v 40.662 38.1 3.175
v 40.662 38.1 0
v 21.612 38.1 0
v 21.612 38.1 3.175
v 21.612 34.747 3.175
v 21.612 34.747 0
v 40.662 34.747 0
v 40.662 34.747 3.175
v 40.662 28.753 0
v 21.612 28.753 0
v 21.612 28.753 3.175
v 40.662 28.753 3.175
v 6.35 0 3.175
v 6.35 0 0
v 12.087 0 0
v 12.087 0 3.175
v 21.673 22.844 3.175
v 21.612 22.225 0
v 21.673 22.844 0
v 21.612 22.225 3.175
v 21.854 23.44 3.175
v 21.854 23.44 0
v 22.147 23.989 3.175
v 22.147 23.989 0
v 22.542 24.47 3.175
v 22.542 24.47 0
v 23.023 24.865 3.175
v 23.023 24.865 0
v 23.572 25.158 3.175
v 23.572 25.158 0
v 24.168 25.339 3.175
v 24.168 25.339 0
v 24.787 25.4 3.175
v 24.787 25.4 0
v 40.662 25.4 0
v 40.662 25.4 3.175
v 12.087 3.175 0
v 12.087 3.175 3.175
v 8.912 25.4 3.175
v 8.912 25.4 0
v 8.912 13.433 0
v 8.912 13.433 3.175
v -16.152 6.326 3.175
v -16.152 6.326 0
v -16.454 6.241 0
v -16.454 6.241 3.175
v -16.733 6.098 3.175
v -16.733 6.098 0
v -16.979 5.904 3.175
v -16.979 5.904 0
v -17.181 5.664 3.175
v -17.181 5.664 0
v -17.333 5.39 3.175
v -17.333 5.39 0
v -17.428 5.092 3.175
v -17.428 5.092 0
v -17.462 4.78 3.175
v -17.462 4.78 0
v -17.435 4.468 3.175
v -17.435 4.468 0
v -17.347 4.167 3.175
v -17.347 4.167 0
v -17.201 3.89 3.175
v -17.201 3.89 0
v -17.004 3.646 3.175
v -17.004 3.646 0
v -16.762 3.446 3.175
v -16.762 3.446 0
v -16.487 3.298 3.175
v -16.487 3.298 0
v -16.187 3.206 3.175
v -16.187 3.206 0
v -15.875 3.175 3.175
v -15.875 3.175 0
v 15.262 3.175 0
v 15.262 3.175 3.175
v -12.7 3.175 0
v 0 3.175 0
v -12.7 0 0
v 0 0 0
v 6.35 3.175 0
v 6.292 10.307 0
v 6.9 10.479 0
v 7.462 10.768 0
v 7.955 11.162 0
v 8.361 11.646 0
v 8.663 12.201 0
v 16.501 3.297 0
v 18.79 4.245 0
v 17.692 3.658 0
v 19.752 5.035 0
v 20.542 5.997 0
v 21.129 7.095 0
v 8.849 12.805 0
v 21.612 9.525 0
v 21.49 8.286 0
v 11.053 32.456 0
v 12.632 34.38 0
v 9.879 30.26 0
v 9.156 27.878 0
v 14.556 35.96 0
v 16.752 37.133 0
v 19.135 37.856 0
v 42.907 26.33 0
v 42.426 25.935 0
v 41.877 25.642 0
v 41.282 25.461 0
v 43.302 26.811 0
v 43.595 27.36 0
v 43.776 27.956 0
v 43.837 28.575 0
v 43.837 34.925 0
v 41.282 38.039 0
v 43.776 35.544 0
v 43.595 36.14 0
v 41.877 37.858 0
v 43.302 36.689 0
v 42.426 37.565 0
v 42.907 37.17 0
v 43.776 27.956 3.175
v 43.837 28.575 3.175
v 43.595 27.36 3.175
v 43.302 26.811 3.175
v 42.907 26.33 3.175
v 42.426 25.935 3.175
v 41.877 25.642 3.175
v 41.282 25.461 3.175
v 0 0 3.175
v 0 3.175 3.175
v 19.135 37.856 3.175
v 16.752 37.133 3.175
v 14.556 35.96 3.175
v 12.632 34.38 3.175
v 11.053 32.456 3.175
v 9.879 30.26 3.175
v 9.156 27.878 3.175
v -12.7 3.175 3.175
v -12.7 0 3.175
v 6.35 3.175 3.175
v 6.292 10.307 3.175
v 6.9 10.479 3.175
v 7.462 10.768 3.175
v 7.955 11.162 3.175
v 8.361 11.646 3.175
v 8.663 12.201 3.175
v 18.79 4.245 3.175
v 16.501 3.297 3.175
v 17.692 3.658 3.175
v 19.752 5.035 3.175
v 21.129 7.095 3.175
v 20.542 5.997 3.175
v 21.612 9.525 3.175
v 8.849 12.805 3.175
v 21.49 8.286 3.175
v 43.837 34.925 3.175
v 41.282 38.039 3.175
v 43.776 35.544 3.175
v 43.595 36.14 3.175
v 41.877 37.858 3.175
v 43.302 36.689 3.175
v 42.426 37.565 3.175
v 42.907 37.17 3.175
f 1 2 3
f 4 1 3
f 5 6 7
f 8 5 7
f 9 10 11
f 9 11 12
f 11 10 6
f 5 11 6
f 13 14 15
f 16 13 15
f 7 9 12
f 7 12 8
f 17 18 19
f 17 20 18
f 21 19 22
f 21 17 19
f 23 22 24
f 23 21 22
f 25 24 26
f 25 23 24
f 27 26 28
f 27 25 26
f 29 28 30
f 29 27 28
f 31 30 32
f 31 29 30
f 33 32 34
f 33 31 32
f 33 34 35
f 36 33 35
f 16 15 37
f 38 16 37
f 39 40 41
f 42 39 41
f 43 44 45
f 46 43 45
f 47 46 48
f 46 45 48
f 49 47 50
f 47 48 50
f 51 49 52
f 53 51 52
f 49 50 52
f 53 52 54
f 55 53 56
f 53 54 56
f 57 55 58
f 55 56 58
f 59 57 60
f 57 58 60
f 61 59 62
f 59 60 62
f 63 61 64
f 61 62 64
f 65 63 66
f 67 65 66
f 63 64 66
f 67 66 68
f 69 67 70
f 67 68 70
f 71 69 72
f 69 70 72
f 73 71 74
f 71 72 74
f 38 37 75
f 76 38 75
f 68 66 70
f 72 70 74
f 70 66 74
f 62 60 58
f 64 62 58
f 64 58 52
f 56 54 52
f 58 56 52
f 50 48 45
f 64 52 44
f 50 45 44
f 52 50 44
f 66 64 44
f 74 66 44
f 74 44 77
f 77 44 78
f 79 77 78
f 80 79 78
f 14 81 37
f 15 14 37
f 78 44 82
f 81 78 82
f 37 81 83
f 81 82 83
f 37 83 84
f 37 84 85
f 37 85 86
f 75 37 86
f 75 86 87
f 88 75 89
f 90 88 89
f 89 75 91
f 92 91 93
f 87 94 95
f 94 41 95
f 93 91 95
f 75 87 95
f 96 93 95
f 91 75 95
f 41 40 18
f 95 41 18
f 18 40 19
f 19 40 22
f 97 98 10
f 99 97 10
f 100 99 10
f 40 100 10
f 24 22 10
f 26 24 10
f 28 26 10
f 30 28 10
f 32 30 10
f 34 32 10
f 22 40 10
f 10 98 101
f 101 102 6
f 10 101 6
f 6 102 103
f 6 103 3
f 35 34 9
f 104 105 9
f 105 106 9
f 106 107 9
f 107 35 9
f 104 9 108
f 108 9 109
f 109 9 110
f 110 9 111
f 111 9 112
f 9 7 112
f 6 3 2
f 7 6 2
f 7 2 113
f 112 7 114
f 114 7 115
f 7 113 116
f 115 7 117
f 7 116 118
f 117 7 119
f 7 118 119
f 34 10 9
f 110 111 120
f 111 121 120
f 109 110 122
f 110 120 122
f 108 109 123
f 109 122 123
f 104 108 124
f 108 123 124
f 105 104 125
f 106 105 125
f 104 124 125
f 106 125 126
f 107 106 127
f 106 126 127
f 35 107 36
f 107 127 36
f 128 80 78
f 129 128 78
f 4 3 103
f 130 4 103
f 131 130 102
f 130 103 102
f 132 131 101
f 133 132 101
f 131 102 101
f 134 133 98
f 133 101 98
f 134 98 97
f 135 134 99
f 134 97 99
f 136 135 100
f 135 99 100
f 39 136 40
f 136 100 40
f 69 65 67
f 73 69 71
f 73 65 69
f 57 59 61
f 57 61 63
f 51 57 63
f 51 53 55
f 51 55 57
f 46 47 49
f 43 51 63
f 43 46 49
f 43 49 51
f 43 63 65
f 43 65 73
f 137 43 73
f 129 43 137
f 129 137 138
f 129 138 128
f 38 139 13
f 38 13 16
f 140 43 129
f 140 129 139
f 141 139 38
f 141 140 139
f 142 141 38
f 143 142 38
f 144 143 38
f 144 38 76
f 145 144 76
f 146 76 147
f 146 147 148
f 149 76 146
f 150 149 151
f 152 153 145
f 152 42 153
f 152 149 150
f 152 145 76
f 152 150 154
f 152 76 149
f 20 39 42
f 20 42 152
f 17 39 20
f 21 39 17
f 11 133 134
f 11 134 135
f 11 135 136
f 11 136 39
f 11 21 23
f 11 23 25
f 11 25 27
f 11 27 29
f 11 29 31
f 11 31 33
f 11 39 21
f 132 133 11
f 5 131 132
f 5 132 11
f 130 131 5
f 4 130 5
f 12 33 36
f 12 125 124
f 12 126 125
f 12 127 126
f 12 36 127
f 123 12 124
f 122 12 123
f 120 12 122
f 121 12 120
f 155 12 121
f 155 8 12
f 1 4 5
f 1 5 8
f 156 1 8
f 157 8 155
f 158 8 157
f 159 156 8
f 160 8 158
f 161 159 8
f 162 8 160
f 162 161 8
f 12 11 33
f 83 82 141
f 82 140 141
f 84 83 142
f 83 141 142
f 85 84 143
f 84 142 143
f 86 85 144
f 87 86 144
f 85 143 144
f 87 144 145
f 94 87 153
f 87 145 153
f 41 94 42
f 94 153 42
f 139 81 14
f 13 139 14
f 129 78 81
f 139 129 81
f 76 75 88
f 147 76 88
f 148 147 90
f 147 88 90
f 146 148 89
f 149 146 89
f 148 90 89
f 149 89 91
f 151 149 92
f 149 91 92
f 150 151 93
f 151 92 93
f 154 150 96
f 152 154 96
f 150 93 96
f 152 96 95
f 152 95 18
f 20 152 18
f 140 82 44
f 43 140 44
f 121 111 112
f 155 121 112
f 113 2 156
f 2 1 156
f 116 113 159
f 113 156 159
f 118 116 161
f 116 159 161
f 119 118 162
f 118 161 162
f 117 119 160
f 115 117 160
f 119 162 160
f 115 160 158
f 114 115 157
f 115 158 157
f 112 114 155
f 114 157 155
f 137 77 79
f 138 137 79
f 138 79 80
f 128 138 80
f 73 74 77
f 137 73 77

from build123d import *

# Parameters (mm, degrees)
SKETCH1_W           = 19.05
SKETCH1_H           = 5.9944
BOSS_EXTRUDE1_DEPTH = 3.175
FILLET1_R           = 3.175
FILLET2_R           = 3.175


with BuildPart() as part:
    # Sketch1 → Boss-Extrude1 (new body)
    with BuildSketch(Plane.XY):
        with BuildLine():
            Line((0, 3.175), (6.35, 3.175))
            Line((6.35, 3.175), (6.35, 0))
            Line((6.35, 0), (12.087173363, 0))
            Line((12.087173363, 0), (12.087173363, 3.175))
            Line((12.087173363, 3.175), (15.262173363, 3.175))
            ThreePointArc((15.262173363, 3.175), (19.752301423, 5.034871939), (21.612173363, 9.525))
            Line((21.612173363, 9.525), (21.612173363, 25.4))
            Line((21.612173363, 25.4), (43.837173363, 25.4))
            Line((43.837173363, 25.4), (43.837173363, 38.1))
            Line((43.837173363, 38.1), (21.612173363, 38.1))
            ThreePointArc((21.612173363, 38.1), (12.631917242, 34.380256121), (8.912173363, 25.4))
            Line((8.912173363, 25.4), (8.912173363, 10.772098947))
            Line((8.912173363, 10.772098947), (-16.152297099, 6.325593909))
            ThreePointArc((-16.152297099, 6.325593909), (-17.456386706, 4.623315466), (-15.875, 3.175))
            Line((-15.875, 3.175), (-12.7, 3.175))
            Line((-12.7, 3.175), (-12.7, 0))
            Line((-12.7, 0), (0, 0))
            Line((0, 0), (0, 3.175))
        make_face()
        with Locations((31.137173363, 31.75)):
            Rectangle(SKETCH1_W, SKETCH1_H, mode=Mode.SUBTRACT)
    extrude(amount=BOSS_EXTRUDE1_DEPTH)

    # Fillet1
    fillet1_edges = [part.edges().sort_by_distance(p)[0] for p in [
        (8.912173363, 10.772098947, 1.5875),
        (21.612173363, 25.4, 1.5875),
    ]]
    fillet(fillet1_edges, radius=FILLET1_R)

    # Fillet2
    fillet2_edges = [part.edges().sort_by_distance(p)[0] for p in [
        (43.837173363, 38.1, 1.5875),
        (43.837173363, 25.4, 1.5875),
    ]]
    fillet(fillet2_edges, radius=FILLET2_R)


solid = part.part
